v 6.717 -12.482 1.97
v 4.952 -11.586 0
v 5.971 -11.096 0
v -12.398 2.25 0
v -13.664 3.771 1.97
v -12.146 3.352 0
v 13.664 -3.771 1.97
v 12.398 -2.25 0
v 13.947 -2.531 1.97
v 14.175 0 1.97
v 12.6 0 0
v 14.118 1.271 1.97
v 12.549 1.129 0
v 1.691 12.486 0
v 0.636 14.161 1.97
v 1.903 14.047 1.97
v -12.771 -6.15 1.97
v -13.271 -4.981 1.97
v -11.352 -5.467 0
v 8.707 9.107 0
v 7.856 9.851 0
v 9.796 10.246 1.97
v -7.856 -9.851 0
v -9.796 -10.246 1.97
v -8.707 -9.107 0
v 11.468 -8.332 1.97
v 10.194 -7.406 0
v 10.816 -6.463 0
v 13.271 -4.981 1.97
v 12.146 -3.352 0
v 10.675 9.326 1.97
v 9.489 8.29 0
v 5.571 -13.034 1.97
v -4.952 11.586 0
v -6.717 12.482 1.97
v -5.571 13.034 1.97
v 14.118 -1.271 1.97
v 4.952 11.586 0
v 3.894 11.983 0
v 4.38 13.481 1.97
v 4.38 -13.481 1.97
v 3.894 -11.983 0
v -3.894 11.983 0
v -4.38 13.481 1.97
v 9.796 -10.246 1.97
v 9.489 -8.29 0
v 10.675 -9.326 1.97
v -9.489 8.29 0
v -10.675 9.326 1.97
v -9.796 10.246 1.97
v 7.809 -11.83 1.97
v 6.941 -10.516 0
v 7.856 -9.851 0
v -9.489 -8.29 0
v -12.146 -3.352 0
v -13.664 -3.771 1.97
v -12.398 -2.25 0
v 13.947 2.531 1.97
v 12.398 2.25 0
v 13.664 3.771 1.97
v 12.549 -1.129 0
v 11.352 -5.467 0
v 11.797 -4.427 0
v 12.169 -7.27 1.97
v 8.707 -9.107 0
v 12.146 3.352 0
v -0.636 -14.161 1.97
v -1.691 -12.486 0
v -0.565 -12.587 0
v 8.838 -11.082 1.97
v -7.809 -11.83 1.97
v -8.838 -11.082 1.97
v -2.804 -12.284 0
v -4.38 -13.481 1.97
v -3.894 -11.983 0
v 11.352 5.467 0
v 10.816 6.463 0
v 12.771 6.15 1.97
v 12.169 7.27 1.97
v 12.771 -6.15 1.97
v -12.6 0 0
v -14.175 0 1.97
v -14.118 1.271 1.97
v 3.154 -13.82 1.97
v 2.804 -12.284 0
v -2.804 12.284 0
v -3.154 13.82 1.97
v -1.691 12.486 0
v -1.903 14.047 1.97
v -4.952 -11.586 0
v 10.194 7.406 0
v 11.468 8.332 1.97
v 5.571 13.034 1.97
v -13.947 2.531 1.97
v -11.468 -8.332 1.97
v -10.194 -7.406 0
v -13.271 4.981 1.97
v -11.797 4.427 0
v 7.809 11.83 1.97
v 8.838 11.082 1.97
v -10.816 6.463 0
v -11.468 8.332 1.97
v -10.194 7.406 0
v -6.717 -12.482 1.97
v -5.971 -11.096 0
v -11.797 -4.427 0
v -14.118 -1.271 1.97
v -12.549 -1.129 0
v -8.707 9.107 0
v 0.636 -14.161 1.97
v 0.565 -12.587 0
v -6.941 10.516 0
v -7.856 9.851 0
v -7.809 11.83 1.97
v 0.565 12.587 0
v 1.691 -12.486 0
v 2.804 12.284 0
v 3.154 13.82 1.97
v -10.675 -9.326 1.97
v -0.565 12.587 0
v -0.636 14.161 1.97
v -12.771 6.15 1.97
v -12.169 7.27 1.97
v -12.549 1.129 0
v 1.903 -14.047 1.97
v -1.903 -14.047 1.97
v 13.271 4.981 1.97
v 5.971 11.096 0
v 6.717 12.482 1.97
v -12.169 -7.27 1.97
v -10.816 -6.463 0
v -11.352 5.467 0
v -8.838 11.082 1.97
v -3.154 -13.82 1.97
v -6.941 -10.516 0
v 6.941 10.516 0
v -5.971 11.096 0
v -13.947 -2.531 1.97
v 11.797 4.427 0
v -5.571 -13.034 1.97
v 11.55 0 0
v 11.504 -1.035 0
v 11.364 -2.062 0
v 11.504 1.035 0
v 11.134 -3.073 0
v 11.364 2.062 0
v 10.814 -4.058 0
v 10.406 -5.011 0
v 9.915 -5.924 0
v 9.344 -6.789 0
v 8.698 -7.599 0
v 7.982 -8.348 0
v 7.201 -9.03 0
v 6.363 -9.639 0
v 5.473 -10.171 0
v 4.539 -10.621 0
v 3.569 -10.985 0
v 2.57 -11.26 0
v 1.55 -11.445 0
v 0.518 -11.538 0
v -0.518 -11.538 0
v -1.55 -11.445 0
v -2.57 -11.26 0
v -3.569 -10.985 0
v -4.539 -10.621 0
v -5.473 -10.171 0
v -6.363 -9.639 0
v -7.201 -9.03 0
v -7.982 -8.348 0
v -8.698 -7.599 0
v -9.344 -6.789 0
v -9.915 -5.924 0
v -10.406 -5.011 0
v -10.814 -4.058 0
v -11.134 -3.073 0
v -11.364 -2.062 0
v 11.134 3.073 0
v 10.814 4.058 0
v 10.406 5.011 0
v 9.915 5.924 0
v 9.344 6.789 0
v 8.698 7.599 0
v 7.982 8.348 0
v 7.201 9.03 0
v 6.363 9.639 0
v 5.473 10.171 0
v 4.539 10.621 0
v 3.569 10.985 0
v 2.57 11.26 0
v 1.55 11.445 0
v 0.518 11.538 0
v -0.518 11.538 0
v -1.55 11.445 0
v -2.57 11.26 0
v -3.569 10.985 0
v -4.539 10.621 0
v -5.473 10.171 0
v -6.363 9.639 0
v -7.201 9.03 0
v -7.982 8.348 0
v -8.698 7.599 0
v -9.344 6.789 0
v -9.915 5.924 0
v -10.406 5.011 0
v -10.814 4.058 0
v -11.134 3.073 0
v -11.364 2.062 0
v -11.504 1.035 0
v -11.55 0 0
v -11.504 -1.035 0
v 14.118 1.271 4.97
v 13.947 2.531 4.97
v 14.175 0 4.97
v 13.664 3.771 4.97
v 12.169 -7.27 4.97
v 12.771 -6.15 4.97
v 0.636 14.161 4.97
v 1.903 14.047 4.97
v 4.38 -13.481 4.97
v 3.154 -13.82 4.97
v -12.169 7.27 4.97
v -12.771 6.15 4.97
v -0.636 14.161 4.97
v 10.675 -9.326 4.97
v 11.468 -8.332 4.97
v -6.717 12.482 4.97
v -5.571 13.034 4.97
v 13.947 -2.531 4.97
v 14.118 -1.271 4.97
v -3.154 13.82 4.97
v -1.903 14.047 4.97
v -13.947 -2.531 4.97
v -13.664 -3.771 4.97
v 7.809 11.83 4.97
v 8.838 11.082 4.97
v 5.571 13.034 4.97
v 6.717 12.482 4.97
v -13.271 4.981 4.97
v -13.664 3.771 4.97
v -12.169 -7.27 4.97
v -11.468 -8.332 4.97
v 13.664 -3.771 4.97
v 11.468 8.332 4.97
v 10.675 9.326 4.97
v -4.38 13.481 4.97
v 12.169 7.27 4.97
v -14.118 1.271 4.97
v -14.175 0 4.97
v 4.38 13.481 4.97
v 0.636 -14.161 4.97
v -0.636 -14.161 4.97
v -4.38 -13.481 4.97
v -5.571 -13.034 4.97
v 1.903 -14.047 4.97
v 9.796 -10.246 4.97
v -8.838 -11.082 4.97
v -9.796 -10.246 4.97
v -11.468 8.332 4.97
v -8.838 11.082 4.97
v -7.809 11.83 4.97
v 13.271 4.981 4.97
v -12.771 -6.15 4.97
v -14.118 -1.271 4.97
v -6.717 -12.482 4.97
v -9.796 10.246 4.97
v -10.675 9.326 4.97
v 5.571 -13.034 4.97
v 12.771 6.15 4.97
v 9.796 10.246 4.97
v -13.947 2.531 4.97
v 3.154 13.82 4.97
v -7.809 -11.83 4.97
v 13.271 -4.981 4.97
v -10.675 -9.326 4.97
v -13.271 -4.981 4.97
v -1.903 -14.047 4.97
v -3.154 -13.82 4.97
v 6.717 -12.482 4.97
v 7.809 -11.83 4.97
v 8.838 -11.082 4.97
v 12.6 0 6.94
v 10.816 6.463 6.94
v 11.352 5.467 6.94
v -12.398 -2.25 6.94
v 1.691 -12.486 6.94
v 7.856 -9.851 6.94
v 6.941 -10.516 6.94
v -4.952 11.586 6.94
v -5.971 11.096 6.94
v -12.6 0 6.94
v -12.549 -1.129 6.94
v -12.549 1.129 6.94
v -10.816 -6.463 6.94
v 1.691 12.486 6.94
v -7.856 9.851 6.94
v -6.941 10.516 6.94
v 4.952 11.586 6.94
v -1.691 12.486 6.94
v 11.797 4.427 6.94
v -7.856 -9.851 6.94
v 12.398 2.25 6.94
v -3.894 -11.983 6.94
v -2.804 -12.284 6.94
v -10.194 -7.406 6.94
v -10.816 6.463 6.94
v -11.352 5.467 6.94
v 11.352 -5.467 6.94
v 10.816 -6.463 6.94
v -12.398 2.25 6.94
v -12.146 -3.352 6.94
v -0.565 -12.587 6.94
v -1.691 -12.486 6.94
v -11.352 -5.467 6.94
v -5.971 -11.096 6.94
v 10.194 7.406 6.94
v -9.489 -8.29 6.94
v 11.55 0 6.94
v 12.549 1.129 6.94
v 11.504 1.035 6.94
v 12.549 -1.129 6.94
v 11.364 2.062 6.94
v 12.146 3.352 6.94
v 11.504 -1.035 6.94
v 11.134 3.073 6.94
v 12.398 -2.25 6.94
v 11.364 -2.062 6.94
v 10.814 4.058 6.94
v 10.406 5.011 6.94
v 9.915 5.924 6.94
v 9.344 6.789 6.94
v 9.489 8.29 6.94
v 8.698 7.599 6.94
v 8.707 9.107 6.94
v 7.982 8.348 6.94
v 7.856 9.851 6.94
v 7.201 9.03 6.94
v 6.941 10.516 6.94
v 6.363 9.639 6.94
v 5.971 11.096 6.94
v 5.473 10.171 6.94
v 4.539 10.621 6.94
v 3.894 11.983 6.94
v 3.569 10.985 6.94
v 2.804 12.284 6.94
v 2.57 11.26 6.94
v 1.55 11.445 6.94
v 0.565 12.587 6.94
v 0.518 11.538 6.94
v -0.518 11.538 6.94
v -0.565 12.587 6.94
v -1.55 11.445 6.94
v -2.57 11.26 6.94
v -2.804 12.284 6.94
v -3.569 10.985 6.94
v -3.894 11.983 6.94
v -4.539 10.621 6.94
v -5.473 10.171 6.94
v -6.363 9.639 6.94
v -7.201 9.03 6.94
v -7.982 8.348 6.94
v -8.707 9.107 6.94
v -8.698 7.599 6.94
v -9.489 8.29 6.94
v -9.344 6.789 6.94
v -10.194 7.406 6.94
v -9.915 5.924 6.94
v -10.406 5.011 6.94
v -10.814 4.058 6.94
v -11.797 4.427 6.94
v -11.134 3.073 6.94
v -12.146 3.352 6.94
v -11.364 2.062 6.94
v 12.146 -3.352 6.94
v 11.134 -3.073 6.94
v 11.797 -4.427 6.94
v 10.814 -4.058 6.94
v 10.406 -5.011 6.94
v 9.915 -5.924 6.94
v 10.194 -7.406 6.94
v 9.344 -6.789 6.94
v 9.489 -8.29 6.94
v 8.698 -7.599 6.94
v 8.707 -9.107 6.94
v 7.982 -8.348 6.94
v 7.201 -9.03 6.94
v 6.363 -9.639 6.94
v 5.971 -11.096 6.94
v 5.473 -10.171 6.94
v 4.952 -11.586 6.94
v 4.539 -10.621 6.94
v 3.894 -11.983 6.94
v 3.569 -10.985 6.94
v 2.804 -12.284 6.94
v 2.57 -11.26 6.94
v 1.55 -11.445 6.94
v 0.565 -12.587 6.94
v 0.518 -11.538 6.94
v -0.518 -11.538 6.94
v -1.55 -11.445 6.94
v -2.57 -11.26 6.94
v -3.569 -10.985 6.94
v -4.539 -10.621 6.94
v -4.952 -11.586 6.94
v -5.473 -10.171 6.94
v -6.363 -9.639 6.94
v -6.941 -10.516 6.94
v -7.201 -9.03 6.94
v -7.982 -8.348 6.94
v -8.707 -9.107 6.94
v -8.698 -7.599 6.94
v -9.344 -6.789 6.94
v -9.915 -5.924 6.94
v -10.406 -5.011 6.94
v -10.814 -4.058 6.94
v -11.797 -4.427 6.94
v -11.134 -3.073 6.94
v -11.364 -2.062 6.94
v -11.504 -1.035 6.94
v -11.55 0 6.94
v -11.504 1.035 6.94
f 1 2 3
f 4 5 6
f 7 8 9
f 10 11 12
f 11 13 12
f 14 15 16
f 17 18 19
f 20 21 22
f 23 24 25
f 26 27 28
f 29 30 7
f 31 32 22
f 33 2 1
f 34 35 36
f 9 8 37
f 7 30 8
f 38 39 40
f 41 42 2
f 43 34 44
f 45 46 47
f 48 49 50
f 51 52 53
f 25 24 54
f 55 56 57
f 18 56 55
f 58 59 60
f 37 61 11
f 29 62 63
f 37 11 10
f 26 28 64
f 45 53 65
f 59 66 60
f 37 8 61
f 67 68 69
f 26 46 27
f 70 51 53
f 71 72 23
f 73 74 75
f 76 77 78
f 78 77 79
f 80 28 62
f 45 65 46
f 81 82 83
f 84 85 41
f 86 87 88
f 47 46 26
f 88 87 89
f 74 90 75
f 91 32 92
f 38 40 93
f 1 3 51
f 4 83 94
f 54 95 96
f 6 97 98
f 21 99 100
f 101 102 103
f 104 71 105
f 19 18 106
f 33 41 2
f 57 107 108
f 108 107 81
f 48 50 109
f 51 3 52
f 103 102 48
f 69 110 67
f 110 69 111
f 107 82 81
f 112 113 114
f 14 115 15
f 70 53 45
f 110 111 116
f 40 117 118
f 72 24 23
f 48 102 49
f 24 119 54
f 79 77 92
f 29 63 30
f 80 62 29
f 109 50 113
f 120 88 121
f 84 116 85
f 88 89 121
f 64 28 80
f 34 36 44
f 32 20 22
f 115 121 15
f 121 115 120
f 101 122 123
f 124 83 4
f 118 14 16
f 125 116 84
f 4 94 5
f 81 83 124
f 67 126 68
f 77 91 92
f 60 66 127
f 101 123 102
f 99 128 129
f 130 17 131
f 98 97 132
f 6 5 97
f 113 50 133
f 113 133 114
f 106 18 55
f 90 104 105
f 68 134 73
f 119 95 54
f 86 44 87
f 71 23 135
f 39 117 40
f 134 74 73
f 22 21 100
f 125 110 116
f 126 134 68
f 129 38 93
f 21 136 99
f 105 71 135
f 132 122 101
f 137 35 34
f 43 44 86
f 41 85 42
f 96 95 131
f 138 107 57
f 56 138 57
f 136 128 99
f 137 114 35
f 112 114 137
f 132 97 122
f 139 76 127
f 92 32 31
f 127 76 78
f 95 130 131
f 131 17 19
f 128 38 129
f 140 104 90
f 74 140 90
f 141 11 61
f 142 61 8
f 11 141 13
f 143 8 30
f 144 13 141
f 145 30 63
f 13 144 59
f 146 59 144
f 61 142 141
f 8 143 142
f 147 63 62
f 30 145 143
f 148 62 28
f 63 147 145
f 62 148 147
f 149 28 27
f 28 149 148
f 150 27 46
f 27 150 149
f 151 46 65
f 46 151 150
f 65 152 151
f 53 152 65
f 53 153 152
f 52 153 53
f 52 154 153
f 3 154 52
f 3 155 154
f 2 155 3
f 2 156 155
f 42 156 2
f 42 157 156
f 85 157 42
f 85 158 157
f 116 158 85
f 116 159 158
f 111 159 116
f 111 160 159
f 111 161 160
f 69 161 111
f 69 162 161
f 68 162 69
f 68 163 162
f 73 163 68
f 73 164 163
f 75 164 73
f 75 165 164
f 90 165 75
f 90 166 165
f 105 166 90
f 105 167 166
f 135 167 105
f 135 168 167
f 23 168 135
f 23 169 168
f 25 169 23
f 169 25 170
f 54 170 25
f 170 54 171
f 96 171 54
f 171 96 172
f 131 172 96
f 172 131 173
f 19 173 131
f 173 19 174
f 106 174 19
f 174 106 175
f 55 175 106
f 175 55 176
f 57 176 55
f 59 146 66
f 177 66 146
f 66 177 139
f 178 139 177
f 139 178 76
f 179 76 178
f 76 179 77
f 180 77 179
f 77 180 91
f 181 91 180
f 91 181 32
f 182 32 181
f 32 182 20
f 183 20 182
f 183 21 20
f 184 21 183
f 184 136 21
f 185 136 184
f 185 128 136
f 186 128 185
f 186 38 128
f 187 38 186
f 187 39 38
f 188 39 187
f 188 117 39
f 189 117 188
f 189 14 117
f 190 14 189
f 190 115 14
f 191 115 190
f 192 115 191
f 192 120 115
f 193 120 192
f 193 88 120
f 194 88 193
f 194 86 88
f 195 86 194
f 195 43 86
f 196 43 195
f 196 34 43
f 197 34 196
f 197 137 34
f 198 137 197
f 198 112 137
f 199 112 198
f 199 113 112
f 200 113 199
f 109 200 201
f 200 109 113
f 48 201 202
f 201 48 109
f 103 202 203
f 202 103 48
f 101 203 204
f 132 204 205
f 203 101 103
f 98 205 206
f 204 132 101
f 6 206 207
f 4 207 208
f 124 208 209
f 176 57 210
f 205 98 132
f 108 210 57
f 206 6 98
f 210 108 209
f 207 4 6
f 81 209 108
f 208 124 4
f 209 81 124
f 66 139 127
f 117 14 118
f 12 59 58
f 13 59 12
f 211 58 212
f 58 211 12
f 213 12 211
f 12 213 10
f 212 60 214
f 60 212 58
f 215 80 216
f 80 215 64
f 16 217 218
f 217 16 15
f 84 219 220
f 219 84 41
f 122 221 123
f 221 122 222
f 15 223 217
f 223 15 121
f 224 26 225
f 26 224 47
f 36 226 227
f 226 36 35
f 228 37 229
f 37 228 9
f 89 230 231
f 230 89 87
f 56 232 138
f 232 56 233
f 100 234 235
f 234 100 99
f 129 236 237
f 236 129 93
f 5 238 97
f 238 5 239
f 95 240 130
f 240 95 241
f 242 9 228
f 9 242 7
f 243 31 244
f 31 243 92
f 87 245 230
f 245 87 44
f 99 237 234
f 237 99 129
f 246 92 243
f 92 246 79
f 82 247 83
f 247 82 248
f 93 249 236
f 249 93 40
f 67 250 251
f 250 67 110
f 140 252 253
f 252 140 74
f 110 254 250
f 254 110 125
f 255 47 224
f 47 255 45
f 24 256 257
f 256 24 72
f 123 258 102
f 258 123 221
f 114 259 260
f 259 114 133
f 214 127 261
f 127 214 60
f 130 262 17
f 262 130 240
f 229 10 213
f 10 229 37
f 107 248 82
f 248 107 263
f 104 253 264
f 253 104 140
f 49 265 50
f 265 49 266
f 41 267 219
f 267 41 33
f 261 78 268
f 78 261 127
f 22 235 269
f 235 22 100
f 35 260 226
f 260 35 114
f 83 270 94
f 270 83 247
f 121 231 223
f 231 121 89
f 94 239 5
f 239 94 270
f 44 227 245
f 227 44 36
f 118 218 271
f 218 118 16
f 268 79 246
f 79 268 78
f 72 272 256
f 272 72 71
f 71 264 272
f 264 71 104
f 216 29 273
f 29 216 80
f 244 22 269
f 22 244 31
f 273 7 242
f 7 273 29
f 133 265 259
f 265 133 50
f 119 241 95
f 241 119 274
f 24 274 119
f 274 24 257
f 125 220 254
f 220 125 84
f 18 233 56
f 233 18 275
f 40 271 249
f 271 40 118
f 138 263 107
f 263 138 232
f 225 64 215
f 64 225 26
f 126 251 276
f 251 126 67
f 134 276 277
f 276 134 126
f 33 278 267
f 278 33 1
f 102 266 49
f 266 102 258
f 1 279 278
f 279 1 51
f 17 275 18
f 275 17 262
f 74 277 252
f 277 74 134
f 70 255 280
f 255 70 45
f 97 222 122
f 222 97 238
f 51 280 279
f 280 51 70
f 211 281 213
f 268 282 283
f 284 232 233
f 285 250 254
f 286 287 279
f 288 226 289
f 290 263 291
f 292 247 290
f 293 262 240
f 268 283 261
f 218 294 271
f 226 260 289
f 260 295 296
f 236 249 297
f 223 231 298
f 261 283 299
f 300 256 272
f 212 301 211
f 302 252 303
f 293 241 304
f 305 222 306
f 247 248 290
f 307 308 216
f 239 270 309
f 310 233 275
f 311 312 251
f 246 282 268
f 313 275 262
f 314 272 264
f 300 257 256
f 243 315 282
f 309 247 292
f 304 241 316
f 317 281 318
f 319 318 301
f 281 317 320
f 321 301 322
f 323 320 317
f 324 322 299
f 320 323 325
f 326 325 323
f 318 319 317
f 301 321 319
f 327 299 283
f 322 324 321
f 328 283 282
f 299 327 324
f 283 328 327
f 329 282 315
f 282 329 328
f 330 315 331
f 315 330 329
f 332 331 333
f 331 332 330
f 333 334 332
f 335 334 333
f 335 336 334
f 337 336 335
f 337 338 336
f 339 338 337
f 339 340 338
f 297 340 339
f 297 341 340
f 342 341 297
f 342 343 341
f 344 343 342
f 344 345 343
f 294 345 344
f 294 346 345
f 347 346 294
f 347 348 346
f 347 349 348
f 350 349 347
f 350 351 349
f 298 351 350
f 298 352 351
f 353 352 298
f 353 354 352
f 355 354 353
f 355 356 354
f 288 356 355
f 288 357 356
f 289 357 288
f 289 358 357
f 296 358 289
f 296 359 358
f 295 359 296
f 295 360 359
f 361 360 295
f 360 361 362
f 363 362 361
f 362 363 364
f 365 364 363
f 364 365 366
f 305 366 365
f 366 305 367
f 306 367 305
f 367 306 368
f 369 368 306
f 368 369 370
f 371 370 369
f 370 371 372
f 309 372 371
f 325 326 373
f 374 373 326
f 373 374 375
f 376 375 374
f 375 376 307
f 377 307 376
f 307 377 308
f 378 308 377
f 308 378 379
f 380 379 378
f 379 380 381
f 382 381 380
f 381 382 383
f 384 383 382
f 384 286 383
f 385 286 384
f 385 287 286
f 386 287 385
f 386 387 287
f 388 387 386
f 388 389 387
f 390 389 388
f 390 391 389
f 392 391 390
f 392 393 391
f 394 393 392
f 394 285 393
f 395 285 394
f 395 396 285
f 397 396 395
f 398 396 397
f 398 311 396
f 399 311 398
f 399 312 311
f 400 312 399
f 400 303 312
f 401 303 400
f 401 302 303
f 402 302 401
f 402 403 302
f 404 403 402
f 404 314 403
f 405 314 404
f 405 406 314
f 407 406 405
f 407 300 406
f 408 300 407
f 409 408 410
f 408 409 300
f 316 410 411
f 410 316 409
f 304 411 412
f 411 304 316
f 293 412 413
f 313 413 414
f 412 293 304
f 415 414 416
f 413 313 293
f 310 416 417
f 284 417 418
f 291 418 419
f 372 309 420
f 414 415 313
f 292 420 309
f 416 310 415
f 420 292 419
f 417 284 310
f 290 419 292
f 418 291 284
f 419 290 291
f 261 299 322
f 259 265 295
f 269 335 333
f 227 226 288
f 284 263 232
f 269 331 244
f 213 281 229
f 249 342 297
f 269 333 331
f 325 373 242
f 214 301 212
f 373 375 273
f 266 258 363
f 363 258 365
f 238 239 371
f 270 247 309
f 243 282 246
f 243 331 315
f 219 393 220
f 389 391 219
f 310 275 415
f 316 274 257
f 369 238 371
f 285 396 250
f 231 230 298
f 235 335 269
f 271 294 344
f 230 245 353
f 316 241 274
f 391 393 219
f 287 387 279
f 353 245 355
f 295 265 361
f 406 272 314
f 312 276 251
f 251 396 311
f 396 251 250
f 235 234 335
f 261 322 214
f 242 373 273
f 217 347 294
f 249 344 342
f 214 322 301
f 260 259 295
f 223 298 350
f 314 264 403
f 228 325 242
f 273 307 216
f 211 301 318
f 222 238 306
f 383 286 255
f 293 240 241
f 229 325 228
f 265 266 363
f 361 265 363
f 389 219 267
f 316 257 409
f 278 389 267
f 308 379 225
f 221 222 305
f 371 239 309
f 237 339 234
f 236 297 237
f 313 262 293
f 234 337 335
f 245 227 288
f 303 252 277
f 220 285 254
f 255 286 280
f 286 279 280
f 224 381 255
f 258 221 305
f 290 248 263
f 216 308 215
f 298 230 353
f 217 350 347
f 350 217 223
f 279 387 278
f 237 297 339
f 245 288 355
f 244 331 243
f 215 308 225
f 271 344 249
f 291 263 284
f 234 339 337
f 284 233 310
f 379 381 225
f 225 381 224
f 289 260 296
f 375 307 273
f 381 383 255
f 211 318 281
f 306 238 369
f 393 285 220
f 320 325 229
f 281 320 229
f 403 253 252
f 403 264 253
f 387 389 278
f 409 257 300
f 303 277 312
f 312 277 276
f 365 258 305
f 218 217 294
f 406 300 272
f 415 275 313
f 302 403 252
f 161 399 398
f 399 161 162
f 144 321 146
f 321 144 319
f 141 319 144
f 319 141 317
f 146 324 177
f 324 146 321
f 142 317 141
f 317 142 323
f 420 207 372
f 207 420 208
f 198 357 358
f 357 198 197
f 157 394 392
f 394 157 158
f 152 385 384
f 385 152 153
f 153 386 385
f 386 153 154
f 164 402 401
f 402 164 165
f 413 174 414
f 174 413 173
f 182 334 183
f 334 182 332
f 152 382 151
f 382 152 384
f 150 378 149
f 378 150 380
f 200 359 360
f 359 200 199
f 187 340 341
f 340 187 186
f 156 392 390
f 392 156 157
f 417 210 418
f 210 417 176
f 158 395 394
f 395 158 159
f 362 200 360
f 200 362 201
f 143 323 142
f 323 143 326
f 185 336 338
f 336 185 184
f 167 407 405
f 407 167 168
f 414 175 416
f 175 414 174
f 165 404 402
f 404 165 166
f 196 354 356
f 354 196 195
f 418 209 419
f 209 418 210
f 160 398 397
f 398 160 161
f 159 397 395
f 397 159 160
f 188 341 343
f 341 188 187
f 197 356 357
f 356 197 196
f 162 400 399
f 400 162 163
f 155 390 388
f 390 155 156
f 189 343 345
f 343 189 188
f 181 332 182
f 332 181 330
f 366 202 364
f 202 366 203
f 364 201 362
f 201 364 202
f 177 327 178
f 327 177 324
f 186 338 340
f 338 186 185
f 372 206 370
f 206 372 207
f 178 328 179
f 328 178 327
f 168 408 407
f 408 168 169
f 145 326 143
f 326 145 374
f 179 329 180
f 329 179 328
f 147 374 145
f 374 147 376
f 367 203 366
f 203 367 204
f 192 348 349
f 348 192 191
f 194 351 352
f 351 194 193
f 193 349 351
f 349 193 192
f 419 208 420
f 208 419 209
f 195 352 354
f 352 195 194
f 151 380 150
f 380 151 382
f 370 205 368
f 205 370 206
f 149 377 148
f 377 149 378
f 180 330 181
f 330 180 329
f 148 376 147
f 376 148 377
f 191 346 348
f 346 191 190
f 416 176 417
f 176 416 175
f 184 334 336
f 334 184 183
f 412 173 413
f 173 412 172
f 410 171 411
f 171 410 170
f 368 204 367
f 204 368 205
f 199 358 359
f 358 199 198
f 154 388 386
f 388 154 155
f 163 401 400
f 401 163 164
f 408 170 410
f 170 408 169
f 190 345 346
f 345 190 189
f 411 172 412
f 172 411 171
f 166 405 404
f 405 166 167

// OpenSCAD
// V sleeve for a 608 bearing
// Created for the Lehi Roller CNC Mill project
// https://github.com/bendetat/lehi-roller

$fn = 70;

scaleFactorX = 1.05;
scaleFactorY = scaleFactorX;
scaleFactorZ = 1.0;

bearingOd = 22;
bearingId = 8;
bearingDepth = 6.94;
sleeveMin = 1;
sleeveMax = 2.5;
sleeveBow = 3;

scale([scaleFactorX,scaleFactorY,scaleFactorZ]) {
	sleeve();
}

module sleeve() {
	difference() {
		union() {
			cylinder(r1=bearingOd/2+sleeveMin, r2=bearingOd/2+sleeveMax, h=bearingDepth/2 - sleeveBow/2);
			translate([0,0,bearingDepth/2-sleeveBow/2]) {
				cylinder(r=bearingOd/2+sleeveMax, h=sleeveBow);
			}
			translate([0,0,bearingDepth/2 + sleeveBow/2]) {
				cylinder(r1=bearingOd/2+sleeveMax, r2=bearingOd/2+sleeveMin, h=bearingDepth/2 - sleeveBow/2);
			}
		}
		translate([0,0,-1]) {
			cylinder(r=bearingOd/2,h=bearingDepth + 2);
		}
	}
}
